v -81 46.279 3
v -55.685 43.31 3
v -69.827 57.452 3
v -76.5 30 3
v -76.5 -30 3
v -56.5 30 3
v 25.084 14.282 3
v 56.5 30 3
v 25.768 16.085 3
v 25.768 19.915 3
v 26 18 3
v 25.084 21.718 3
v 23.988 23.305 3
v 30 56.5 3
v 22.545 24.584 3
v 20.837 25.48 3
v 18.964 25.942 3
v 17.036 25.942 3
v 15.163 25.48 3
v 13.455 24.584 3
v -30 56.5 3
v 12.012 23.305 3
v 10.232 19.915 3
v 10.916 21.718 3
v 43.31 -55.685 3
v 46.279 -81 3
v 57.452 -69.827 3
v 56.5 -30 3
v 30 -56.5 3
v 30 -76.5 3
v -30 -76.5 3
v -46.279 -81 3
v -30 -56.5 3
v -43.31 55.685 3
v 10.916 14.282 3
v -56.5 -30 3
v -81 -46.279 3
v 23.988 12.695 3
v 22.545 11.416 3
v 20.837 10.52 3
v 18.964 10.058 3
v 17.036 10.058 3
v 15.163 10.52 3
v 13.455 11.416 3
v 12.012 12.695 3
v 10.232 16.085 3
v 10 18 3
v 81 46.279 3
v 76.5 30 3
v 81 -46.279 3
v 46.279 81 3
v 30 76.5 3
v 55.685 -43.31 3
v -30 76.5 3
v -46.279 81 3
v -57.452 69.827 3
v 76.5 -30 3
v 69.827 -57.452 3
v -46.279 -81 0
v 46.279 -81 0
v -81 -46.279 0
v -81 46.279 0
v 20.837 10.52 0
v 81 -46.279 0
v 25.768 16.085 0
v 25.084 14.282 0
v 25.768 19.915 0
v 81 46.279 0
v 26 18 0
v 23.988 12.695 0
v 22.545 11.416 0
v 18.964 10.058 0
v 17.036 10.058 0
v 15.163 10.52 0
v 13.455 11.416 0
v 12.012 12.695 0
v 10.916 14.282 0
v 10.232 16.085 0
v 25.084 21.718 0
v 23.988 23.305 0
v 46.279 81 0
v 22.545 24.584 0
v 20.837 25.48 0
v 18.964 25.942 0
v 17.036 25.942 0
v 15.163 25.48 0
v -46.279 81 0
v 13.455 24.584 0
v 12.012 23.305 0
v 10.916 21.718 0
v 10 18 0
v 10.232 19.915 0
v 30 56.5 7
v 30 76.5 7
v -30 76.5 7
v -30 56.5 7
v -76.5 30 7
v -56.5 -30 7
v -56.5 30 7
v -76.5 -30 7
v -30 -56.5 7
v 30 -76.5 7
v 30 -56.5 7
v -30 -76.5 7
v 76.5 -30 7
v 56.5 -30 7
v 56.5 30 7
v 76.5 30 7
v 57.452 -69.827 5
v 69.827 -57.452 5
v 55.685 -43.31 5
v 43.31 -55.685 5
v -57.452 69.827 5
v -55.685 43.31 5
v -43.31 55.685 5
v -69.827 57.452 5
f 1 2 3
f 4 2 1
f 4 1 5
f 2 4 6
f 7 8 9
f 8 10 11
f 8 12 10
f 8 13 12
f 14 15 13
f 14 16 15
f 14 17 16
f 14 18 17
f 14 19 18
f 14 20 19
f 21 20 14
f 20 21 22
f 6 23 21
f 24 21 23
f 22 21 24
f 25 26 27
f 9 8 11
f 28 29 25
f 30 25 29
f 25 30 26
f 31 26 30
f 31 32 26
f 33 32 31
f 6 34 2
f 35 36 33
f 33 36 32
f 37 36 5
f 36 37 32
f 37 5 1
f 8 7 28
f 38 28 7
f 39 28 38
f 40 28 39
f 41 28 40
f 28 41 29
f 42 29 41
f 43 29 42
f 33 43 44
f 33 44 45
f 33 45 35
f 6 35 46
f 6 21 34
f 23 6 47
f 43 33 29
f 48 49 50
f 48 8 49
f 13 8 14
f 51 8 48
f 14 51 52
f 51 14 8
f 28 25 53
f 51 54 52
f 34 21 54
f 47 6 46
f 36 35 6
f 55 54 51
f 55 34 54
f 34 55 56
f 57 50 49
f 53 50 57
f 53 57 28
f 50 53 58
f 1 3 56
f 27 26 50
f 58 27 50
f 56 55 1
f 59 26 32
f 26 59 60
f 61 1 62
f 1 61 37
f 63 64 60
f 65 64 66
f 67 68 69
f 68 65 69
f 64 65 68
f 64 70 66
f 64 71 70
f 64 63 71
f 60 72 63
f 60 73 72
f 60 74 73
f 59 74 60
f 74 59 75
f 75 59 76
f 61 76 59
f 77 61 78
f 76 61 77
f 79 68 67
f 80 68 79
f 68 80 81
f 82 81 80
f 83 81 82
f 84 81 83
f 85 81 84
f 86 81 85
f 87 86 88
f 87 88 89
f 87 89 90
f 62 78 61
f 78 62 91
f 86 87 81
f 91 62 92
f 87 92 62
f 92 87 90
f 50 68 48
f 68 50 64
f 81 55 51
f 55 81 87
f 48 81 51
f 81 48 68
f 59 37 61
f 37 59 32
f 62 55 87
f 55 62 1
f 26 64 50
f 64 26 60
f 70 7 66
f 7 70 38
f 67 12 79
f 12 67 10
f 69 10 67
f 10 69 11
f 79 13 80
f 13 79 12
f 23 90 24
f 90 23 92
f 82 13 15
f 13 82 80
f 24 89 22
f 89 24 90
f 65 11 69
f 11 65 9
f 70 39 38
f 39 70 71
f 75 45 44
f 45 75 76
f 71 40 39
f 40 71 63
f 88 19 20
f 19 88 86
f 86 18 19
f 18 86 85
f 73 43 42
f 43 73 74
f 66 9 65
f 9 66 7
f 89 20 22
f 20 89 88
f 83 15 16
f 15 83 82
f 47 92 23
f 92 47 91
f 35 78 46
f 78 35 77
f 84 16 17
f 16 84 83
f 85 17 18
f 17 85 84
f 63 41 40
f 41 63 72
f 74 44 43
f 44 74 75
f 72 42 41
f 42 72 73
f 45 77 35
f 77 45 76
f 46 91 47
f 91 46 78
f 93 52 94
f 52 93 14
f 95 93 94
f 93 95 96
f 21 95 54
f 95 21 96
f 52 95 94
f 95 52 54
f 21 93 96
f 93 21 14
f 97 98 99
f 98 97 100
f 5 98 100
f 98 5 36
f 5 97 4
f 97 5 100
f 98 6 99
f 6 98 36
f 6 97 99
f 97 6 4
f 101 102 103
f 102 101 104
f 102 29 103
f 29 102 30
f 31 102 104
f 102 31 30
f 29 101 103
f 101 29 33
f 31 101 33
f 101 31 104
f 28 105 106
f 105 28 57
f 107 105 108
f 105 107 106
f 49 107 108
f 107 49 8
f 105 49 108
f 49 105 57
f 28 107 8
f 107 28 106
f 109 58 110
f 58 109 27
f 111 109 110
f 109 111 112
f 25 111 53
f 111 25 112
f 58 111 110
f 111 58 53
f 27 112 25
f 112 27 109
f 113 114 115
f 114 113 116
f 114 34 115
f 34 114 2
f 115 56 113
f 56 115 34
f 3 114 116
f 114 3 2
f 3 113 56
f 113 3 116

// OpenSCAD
// file: ../lib/JMO_library.scad
/* MAGNOLIO QUADCOPTER

FILE: JMO_library.scad

AUTHOR: Jose Manuel Ortiz

DESCRIPTION:
General purpose primitive modules

LICENSE:
Magnolio by Kinamics is licensed under a Creative Commons Attribution-ShareAlike 4.0 International License.
http://creativecommons.org/licenses/by-sa/4.0/
*/

//an open case with open base, wall width d and chamfer specified by d1
module case_base_open(l=160, h=32, w=55, d=4, d1=2){
	h1 = sqrt(w*w/4+h*h);
	h2 = h1-d1-d;
	x1 = w*h1/(2*h2);
	y1 = h*h1/h2;
	x2 = d1*w/(2*h1);
	alpha = atan(2*h/w);
	//echo("h1=",h1," h2=",h2," x1=",x1," y1=",y1," x2=",x2, " alpha=",alpha);
	
	rotate([90,0,0])
	translate([0,0,-l/2])
	difference(){
		union(){
			//main box
			translate([w/2,0,0]) cube([d,h,l]);
			translate([0,d/2+h,l/2]) cube([w+2*d,d,l],center=true);
			translate([-w/2-d,0,0]) cube([d,h,l]);
			
			//chamfers
			rotate([0,0,90-alpha])
				translate([0,h2+d/2+d,l/2])
					cube([2*x2+2*d,d,l],center=true);
			rotate([0,0,-90+alpha])
				translate([0,h2+d/2+d,l/2])
					cube([2*x2+2*d,d,l],center=true);
		}
		//remove excess
		rotate([0,0,90-alpha])
				translate([0,h2+3*d,l/2])
					cube([2*x2+2*d,2*d,l+1],center=true);
		rotate([0,0,-90+alpha])
				translate([0,h2+3*d,l/2])
					cube([2*x2+2*d,2*d,l+1],center=true);
		translate([w/2+d,0,-0.5]) cube([d,h+2*d,l+1]);
		translate([0,d+d/2+h,l/2]) cube([w+2*d,d,l+1],center=true);
		translate([-w/2-2*d,0,-0.5]) cube([d,h+3*d,l+1]);
	}
}
//case_base_open();

//Pyramid module: generalization of Openscad manual example
module pyramid_square_base(w=10, l=10, h=10){
	polyhedron(
		points=[ [w/2,l/2,0],[w/2,-l/2,0],[-w/2,-l/2,0],[-w/2,l/2,0], // the four points at base
           [0,0,h]  ],                                 // the apex point 
  faces=[ [0,1,4],[1,2,4],[2,3,4],[3,0,4],              // each triangle side
              [1,0,3],[2,1,3] ]);                         // two triangles for square base
}
//pyramid_square_base(w=150, l=150, h=60);
// main file
/*
Battery Holder Base

Print settings (Sli3r v1.1.7, these are merely my sugestions, not necessarily the best ones):
- Black ABS, 3mm filament
- layer height: 0.3
- perimeters: 4
- Solid layers: 3 (top), 3 (bottom)
- Infill: 100% rectilinear
- Speed: 50mm/s (permeters), 80mm/s (infill)
- Support Material: No
- Temperature: 240ºC (extruder), 120ºC (bed)

Other info:
- 3mm glass bed with kapton tape
- nozzle diameter: 0.35mm
- bed size: 170 (x), 180 (y)
- G-Code flavor: RepRap Marlin

*/

include <../Magnolio_parts.scad>

battery_holder_base();
